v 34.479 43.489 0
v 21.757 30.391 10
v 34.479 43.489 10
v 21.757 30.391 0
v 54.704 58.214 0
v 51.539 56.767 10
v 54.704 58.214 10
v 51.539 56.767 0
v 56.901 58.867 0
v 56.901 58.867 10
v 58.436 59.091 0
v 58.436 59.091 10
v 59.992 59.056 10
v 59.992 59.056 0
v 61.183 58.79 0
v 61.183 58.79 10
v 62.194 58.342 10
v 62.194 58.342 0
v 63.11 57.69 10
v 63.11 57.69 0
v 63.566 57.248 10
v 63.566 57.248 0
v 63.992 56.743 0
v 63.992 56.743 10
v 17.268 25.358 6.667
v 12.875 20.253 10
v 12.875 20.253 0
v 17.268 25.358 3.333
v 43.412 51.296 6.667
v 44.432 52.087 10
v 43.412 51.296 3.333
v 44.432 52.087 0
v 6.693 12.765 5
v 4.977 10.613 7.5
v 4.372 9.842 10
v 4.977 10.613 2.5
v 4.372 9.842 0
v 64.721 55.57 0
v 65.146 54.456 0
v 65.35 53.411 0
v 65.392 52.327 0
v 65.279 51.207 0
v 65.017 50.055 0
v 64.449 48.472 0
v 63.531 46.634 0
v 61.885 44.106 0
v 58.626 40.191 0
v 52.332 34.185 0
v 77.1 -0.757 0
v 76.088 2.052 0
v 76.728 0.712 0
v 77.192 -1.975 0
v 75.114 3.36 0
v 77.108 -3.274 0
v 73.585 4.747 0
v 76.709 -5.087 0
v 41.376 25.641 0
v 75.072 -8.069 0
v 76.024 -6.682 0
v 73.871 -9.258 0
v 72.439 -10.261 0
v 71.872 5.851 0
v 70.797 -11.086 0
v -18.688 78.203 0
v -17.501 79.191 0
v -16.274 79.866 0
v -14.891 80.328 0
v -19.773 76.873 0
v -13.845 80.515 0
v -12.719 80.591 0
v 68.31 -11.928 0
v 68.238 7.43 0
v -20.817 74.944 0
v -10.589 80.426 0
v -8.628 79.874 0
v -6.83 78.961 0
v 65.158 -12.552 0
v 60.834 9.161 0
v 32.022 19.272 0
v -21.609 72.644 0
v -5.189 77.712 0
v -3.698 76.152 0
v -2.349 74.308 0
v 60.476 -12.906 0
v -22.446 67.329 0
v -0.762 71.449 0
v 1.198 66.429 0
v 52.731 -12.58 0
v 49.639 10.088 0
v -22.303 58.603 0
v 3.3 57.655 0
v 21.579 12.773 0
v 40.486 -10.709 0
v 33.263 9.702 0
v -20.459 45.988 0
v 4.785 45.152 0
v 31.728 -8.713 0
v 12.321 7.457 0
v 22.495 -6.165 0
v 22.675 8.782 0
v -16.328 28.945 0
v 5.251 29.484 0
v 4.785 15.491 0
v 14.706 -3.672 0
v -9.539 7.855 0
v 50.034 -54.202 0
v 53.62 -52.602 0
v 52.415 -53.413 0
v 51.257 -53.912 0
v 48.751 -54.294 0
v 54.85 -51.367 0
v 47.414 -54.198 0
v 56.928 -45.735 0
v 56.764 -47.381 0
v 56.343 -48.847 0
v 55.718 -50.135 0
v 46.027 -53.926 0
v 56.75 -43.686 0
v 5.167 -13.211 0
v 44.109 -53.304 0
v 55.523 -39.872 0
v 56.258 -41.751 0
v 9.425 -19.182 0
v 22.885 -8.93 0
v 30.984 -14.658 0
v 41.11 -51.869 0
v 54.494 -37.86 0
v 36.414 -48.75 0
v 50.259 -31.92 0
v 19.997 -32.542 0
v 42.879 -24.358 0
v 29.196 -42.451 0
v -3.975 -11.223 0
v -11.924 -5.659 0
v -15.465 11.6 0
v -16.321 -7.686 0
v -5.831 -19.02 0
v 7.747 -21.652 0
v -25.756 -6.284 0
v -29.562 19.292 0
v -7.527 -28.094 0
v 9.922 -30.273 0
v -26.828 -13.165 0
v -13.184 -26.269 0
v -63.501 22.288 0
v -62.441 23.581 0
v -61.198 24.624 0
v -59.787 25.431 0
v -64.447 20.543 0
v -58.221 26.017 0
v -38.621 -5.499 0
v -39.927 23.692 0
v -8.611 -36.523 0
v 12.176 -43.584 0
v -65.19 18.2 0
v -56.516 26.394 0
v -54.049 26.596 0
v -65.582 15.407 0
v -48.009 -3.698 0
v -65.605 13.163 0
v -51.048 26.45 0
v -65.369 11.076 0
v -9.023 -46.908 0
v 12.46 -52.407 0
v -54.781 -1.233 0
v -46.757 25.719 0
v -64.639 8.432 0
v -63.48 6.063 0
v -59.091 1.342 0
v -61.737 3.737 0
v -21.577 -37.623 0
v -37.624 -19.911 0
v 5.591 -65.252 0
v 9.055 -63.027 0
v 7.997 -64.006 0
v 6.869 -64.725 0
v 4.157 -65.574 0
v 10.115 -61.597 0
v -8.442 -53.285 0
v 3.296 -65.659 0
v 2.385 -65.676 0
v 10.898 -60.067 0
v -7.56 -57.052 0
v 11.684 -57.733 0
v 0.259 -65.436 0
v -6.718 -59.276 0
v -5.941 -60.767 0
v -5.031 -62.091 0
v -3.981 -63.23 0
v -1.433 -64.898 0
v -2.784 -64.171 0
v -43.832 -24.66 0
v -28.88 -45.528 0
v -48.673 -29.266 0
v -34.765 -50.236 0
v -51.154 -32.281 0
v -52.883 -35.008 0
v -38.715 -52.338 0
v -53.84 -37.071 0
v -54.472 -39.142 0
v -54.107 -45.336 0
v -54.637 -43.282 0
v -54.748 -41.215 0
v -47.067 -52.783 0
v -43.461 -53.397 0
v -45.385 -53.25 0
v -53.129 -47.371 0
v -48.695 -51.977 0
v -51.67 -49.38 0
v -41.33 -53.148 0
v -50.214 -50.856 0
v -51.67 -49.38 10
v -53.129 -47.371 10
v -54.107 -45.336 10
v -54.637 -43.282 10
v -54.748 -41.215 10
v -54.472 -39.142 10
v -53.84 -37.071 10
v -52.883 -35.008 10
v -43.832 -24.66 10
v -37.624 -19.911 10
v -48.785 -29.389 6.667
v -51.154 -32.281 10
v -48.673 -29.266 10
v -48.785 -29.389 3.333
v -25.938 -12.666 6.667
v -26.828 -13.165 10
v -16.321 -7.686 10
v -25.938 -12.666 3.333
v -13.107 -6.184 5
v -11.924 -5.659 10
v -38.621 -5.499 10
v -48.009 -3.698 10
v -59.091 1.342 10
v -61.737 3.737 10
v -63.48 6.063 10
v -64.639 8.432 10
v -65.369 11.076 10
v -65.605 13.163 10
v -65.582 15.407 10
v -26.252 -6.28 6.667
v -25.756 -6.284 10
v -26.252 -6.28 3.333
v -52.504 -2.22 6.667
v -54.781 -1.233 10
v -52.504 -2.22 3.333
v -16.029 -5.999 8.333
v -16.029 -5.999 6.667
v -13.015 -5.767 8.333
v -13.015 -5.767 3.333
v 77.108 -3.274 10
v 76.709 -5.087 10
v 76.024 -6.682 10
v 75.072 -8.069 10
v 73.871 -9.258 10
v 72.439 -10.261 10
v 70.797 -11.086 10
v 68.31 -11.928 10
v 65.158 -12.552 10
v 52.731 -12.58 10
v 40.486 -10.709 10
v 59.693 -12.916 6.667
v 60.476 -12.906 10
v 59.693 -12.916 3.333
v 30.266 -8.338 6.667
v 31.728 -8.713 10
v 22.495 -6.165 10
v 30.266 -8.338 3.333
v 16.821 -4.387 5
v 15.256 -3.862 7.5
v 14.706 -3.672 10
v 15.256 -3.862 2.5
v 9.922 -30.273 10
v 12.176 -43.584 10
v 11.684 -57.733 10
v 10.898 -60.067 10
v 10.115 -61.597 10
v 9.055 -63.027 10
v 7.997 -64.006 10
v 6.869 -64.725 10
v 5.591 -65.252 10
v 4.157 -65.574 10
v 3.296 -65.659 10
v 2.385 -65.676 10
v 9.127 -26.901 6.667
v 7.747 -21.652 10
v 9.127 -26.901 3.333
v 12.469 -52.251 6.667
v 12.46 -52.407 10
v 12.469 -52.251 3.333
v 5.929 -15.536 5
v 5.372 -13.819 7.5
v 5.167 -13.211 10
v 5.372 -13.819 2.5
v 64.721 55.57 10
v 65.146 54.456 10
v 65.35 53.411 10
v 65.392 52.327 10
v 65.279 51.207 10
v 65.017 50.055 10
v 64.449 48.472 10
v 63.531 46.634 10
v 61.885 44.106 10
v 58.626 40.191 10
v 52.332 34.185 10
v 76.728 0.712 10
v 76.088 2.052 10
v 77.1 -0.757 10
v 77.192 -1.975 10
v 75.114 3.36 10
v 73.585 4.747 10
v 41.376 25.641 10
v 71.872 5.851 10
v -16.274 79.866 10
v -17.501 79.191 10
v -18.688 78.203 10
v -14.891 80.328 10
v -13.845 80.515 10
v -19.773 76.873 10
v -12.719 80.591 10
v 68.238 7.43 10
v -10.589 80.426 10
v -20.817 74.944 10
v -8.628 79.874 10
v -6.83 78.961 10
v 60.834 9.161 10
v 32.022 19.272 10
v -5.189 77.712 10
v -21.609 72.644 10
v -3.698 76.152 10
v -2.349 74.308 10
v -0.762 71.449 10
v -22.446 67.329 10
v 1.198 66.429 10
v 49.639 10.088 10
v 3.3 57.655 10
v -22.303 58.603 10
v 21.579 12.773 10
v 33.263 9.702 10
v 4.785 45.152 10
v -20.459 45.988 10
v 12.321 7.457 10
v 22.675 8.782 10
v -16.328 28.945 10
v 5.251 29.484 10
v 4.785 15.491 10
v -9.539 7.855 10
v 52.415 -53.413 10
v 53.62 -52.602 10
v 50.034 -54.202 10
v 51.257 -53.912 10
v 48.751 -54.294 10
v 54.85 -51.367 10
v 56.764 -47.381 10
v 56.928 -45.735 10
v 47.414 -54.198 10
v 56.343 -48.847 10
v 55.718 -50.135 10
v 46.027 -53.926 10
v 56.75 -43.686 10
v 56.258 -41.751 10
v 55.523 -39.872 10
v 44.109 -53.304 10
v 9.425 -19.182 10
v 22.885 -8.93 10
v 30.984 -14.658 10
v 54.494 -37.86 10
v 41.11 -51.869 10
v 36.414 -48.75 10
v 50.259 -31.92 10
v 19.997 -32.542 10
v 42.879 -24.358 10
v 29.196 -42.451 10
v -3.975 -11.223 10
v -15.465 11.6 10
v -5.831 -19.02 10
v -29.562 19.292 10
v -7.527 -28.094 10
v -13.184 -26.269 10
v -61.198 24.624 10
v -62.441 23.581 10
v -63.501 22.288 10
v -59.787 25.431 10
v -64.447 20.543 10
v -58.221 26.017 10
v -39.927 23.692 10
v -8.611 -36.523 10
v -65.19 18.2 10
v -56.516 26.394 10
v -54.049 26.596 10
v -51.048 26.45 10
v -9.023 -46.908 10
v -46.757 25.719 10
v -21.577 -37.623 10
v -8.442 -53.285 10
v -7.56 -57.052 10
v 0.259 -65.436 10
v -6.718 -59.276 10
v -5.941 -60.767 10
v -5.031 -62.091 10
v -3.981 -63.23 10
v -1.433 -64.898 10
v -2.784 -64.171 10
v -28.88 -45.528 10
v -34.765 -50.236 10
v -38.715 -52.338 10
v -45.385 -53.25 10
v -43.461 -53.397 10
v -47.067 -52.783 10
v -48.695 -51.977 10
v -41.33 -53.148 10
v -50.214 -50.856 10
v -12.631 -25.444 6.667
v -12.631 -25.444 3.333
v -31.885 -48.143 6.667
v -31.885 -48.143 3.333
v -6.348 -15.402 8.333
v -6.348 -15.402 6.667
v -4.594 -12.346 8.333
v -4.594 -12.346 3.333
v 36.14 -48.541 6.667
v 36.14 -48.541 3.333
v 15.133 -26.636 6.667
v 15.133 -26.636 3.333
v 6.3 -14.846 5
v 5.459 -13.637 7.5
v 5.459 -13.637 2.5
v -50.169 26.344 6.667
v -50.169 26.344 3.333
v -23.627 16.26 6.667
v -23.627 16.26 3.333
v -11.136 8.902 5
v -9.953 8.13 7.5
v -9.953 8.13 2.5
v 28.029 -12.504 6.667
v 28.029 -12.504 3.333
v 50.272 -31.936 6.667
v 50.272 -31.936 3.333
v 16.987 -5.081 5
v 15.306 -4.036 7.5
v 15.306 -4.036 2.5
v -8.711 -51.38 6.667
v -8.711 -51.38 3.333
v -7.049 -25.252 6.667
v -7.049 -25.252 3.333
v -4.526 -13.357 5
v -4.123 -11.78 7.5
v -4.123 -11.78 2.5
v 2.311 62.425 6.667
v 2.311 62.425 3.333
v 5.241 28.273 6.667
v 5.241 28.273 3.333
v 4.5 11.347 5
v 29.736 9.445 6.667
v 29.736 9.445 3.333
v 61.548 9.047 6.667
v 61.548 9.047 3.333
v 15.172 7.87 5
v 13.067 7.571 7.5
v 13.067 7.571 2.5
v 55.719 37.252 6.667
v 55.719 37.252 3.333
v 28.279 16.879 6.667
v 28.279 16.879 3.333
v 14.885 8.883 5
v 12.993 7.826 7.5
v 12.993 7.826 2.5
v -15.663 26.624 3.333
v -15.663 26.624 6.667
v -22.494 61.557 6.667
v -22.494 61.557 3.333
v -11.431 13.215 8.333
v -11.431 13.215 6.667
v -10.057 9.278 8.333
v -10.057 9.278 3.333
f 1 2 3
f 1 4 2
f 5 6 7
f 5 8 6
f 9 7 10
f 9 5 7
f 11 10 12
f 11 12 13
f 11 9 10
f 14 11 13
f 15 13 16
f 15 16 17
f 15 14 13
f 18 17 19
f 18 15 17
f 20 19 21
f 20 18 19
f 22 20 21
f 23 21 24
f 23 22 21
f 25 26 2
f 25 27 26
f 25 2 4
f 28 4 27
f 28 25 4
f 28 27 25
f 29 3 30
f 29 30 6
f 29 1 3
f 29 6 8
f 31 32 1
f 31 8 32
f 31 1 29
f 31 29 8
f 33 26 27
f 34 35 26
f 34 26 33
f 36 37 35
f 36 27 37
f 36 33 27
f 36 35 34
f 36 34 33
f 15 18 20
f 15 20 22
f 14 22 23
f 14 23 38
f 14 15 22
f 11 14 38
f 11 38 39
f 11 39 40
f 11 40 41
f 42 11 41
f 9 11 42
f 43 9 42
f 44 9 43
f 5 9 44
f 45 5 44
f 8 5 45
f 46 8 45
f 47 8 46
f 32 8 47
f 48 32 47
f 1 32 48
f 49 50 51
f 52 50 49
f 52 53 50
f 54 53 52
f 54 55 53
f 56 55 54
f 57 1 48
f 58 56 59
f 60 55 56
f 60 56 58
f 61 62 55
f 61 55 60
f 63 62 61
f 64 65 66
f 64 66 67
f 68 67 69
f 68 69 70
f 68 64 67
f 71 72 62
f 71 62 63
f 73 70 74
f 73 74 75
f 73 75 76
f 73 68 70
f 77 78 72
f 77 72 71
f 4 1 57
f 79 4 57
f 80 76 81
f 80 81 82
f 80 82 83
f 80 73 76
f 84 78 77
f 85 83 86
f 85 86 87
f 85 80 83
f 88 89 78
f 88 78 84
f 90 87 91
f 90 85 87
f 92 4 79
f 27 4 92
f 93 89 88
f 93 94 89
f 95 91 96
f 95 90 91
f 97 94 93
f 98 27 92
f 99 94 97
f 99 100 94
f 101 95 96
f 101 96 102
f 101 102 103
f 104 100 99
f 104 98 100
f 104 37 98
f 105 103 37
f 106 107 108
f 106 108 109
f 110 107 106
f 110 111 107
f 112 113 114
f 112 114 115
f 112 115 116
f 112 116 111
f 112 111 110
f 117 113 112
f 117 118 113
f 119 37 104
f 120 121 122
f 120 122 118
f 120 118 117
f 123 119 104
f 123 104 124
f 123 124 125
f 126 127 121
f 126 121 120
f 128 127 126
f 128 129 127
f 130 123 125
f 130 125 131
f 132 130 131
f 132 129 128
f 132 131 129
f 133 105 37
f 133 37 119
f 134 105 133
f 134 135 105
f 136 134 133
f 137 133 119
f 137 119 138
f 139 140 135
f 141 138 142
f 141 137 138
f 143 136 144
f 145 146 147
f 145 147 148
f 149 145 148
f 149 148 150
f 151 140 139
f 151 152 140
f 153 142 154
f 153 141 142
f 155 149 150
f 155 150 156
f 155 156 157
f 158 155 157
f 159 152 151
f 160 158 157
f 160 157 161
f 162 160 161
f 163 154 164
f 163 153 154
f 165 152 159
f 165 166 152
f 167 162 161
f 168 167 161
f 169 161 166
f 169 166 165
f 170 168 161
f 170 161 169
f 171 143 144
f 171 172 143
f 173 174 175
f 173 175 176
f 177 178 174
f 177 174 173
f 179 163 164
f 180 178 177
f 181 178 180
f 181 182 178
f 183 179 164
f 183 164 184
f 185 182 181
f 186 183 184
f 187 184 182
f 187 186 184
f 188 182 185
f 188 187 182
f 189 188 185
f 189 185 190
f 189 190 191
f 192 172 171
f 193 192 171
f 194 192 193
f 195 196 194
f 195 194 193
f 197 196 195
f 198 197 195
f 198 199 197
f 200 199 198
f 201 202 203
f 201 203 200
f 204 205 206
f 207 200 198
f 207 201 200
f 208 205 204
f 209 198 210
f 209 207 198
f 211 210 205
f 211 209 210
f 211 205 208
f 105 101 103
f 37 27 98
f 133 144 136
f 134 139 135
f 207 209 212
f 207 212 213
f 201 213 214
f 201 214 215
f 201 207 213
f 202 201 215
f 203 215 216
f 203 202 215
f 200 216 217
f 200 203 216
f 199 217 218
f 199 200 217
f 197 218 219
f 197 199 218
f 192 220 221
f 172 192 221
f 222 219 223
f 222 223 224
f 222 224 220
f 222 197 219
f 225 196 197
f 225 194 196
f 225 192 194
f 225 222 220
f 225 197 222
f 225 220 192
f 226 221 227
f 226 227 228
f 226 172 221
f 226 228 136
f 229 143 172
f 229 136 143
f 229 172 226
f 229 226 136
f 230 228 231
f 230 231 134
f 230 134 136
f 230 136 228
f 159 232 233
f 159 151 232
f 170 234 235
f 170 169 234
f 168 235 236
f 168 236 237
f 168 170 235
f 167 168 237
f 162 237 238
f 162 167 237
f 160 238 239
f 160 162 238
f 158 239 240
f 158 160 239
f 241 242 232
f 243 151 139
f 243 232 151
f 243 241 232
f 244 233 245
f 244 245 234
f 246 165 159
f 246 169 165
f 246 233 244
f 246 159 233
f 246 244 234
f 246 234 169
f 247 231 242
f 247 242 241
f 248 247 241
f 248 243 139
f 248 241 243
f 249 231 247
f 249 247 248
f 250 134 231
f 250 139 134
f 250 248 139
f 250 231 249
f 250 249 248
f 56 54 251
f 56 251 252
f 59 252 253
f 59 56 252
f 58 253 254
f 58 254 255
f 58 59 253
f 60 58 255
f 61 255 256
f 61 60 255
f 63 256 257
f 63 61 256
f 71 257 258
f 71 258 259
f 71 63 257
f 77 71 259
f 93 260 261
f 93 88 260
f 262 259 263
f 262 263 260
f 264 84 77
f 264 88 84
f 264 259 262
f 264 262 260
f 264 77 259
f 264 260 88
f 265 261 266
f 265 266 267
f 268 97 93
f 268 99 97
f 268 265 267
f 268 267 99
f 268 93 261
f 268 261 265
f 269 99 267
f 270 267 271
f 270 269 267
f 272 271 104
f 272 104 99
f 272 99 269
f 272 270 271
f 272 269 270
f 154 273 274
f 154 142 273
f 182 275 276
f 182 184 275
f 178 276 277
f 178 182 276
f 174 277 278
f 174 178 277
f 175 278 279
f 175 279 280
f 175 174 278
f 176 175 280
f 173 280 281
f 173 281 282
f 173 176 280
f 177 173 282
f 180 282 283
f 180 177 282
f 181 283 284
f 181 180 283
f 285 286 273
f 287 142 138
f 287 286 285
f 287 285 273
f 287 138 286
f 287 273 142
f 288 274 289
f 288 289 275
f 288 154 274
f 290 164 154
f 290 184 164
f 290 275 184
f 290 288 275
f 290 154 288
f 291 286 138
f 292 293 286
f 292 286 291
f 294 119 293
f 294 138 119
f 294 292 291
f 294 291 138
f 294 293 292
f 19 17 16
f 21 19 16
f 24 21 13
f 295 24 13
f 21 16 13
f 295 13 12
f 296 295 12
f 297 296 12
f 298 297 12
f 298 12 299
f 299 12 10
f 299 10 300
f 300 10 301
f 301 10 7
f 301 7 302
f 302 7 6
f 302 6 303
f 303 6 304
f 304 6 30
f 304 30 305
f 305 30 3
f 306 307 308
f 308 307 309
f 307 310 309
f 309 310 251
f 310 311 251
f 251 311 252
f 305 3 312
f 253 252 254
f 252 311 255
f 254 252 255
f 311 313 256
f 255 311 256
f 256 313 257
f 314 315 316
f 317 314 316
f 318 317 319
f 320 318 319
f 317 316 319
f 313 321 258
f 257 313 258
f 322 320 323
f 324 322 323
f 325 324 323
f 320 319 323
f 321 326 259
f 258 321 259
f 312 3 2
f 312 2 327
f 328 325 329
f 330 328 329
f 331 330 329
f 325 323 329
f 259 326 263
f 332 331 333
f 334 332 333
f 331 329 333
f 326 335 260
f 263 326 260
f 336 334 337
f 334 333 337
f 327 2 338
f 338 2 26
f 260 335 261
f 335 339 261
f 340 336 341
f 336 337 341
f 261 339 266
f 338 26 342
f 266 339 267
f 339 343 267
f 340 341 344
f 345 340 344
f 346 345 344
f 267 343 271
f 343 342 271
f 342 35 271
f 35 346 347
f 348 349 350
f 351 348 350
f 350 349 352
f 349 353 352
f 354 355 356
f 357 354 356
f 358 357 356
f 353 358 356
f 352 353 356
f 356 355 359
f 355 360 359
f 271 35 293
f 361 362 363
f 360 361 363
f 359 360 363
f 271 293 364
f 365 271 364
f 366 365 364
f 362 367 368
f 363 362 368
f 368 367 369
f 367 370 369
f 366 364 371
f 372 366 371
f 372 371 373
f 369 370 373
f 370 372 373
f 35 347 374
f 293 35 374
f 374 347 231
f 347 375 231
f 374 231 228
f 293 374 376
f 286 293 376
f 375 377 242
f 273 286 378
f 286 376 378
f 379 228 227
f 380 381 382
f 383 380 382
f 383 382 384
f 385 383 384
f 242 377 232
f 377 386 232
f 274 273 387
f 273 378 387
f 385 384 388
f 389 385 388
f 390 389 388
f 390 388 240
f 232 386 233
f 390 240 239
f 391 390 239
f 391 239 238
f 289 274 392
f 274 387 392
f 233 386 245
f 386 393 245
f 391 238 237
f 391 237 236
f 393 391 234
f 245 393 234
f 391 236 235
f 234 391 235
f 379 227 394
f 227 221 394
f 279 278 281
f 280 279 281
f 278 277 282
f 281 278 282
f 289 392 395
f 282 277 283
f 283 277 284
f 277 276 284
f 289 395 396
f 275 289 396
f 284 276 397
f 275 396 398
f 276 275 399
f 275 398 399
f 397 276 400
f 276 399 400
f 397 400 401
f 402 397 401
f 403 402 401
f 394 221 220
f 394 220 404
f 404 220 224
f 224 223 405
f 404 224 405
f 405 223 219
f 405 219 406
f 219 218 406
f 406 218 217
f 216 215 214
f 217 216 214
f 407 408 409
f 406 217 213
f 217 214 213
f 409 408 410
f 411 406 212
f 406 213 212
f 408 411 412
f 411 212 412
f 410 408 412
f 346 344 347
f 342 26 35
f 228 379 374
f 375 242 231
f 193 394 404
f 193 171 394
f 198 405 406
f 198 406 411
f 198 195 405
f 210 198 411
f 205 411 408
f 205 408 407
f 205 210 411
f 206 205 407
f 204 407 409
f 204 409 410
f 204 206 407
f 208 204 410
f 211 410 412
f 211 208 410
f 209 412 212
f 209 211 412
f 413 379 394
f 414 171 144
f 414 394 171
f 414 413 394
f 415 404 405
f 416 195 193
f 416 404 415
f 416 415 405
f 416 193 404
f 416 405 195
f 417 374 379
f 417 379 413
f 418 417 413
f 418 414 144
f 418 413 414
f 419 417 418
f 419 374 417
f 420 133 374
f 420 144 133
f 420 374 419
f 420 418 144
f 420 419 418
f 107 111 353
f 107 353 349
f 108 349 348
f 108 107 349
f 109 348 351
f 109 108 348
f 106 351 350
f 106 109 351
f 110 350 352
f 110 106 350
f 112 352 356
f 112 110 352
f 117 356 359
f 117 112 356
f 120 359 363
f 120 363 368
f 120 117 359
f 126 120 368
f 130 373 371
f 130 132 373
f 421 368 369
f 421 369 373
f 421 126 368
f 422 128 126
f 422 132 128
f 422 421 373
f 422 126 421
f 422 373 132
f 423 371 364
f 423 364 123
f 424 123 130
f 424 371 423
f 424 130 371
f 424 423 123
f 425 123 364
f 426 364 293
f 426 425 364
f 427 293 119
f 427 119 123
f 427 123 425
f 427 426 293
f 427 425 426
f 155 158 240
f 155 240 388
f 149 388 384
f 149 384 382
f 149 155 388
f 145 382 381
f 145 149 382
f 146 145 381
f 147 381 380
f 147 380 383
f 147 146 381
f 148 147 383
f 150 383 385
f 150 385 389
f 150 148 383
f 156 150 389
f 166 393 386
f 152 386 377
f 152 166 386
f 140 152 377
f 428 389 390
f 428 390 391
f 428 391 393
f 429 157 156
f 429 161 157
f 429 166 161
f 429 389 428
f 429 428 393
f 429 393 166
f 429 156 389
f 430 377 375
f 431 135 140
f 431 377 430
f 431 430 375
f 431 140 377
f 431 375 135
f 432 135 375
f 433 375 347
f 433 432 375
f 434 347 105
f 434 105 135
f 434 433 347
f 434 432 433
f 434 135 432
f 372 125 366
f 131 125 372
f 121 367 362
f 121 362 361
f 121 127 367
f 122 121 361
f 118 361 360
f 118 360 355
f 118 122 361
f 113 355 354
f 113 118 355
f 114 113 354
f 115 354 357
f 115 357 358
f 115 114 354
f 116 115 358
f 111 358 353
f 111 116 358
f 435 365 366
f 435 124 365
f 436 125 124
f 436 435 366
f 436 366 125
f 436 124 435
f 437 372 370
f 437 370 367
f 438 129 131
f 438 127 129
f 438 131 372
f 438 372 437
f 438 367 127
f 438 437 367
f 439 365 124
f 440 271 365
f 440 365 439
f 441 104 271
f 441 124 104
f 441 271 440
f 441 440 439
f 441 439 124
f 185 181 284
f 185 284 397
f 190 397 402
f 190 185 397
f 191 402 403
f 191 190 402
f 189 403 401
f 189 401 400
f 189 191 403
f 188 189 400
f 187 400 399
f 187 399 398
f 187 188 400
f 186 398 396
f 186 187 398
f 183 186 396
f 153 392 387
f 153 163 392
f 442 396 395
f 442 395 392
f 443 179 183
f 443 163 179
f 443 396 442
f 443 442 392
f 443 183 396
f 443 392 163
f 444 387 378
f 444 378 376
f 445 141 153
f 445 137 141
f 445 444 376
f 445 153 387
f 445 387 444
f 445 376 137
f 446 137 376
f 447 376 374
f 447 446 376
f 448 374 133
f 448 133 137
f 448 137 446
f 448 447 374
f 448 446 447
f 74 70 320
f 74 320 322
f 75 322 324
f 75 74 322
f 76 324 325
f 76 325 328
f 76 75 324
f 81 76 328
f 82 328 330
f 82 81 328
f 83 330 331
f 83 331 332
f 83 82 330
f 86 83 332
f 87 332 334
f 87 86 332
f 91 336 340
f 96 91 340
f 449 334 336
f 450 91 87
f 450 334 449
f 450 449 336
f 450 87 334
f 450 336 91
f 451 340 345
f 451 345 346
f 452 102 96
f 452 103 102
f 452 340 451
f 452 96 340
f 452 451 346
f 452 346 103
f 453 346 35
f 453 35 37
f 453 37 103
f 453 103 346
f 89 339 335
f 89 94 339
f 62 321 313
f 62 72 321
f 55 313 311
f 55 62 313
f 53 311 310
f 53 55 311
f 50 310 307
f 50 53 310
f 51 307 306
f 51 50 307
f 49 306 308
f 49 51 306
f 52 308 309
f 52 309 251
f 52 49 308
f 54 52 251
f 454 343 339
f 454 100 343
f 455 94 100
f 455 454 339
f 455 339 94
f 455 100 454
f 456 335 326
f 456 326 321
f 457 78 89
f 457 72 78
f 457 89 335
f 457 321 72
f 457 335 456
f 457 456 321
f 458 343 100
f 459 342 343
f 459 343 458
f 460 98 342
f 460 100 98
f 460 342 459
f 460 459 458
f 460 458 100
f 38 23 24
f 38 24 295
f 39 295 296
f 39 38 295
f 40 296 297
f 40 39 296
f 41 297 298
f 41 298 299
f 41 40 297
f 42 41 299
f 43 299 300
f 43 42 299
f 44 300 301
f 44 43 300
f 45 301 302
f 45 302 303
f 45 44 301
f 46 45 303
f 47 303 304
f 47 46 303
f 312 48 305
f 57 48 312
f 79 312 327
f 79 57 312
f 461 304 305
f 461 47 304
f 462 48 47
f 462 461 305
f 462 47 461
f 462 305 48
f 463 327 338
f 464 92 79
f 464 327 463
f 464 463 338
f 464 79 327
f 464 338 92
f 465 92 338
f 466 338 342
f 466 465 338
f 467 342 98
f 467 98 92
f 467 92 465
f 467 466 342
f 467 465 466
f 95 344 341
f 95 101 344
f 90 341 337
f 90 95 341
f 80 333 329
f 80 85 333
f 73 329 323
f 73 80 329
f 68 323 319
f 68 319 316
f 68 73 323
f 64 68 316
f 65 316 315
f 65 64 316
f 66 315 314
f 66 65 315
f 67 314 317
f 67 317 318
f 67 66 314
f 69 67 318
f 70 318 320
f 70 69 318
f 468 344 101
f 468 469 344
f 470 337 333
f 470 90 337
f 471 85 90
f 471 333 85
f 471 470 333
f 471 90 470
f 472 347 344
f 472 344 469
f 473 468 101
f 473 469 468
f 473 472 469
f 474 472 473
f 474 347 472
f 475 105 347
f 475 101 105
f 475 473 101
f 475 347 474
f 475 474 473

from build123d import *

# Parameters (mm, degrees)
EXTRUDE_DEPTH = 10


with BuildPart() as part:
    # path4138 → Extrude (new body)
    with BuildSketch(Plane(origin=(6.216936, 7.457358, 0), x_dir=(0, -1, 0), z_dir=(0, 0, -1))):
        with BuildLine():
            add(Edge.make_bspline(
                [(-0.397465, 15.756072), (-0.397465, 15.756072), (-72.735897, 42.783617), (-73.133362, 18.935779)],
                knots=[0, 0, 0, 0, 1, 1, 1, 1], degree=3))
            add(Edge.make_bspline(
                [(-73.133362, 18.935779), (-73.530824, -4.912055), (-2.384783, 1.844833), (-2.384783, 1.844833)],
                knots=[0, 0, 0, 0, 1, 1, 1, 1], degree=3))
            add(Edge.make_bspline(
                [(-2.384783, 1.844833), (-2.384783, 1.844833), (-64.389155, -46.248299), (-49.285525, -57.774754)],
                knots=[0, 0, 0, 0, 1, 1, 1, 1], degree=3))
            add(Edge.make_bspline(
                [(-49.285525, -57.774754), (-34.181898, -69.301206), (0, -6.104444), (0, -6.104444)],
                knots=[0, 0, 0, 0, 1, 1, 1, 1], degree=3))
            add(Edge.make_bspline(
                [(0, -6.104444), (0, -6.104444), (-10.731525, -73.673308), (10.731526, -70.891063)],
                knots=[0, 0, 0, 0, 1, 1, 1, 1], degree=3))
            add(Edge.make_bspline(
                [(10.731526, -70.891063), (32.194576, -68.108814), (11.128991, -8.48923), (11.128991, -8.48923)],
                knots=[0, 0, 0, 0, 1, 1, 1, 1], degree=3))
            add(Edge.make_bspline(
                [(11.128991, -8.48923), (11.128991, -8.48923), (42.926102, -61.749391), (58.824659, -48.633082)],
                knots=[0, 0, 0, 0, 1, 1, 1, 1], degree=3))
            add(Edge.make_bspline(
                [(58.824659, -48.633082), (74.723216, -35.516773), (20.668124, 1.049906), (20.668124, 1.049906)],
                knots=[0, 0, 0, 0, 1, 1, 1, 1], degree=3))
            add(Edge.make_bspline(
                [(20.668124, 1.049906), (20.668124, 1.049906), (73.530824, -17.233434), (73.133362, 3.832152)],
                knots=[0, 0, 0, 0, 1, 1, 1, 1], degree=3))
            add(Edge.make_bspline(
                [(73.133362, 3.832152), (72.732307, 25.088046), (18.680803, 10.191575), (18.680803, 10.191575)],
                knots=[0, 0, 0, 0, 1, 1, 1, 1], degree=3))
            add(Edge.make_bspline(
                [(18.680803, 10.191575), (18.680803, 10.191575), (76.313072, 41.193764), (56.83734, 57.887248)],
                knots=[0, 0, 0, 0, 1, 1, 1, 1], degree=3))
            add(Edge.make_bspline(
                [(56.83734, 57.887248), (37.361608, 74.580732), (13.116309, 18.140852), (13.116309, 18.140852)],
                knots=[0, 0, 0, 0, 1, 1, 1, 1], degree=3))
            add(Edge.make_bspline(
                [(13.116309, 18.140852), (13.116309, 18.140852), (19.423121, 73.673308), (-7.949277, 71.798483)],
                knots=[0, 0, 0, 0, 1, 1, 1, 1], degree=3))
            add(Edge.make_bspline(
                [(-7.949277, 71.798483), (-36.964146, 69.811165), (-0.397465, 15.756072), (-0.397465, 15.756072)],
                knots=[0, 0, 0, 0, 1, 1, 1, 1], degree=3))
        make_face()
    extrude(amount=-EXTRUDE_DEPTH)


solid = part.part
